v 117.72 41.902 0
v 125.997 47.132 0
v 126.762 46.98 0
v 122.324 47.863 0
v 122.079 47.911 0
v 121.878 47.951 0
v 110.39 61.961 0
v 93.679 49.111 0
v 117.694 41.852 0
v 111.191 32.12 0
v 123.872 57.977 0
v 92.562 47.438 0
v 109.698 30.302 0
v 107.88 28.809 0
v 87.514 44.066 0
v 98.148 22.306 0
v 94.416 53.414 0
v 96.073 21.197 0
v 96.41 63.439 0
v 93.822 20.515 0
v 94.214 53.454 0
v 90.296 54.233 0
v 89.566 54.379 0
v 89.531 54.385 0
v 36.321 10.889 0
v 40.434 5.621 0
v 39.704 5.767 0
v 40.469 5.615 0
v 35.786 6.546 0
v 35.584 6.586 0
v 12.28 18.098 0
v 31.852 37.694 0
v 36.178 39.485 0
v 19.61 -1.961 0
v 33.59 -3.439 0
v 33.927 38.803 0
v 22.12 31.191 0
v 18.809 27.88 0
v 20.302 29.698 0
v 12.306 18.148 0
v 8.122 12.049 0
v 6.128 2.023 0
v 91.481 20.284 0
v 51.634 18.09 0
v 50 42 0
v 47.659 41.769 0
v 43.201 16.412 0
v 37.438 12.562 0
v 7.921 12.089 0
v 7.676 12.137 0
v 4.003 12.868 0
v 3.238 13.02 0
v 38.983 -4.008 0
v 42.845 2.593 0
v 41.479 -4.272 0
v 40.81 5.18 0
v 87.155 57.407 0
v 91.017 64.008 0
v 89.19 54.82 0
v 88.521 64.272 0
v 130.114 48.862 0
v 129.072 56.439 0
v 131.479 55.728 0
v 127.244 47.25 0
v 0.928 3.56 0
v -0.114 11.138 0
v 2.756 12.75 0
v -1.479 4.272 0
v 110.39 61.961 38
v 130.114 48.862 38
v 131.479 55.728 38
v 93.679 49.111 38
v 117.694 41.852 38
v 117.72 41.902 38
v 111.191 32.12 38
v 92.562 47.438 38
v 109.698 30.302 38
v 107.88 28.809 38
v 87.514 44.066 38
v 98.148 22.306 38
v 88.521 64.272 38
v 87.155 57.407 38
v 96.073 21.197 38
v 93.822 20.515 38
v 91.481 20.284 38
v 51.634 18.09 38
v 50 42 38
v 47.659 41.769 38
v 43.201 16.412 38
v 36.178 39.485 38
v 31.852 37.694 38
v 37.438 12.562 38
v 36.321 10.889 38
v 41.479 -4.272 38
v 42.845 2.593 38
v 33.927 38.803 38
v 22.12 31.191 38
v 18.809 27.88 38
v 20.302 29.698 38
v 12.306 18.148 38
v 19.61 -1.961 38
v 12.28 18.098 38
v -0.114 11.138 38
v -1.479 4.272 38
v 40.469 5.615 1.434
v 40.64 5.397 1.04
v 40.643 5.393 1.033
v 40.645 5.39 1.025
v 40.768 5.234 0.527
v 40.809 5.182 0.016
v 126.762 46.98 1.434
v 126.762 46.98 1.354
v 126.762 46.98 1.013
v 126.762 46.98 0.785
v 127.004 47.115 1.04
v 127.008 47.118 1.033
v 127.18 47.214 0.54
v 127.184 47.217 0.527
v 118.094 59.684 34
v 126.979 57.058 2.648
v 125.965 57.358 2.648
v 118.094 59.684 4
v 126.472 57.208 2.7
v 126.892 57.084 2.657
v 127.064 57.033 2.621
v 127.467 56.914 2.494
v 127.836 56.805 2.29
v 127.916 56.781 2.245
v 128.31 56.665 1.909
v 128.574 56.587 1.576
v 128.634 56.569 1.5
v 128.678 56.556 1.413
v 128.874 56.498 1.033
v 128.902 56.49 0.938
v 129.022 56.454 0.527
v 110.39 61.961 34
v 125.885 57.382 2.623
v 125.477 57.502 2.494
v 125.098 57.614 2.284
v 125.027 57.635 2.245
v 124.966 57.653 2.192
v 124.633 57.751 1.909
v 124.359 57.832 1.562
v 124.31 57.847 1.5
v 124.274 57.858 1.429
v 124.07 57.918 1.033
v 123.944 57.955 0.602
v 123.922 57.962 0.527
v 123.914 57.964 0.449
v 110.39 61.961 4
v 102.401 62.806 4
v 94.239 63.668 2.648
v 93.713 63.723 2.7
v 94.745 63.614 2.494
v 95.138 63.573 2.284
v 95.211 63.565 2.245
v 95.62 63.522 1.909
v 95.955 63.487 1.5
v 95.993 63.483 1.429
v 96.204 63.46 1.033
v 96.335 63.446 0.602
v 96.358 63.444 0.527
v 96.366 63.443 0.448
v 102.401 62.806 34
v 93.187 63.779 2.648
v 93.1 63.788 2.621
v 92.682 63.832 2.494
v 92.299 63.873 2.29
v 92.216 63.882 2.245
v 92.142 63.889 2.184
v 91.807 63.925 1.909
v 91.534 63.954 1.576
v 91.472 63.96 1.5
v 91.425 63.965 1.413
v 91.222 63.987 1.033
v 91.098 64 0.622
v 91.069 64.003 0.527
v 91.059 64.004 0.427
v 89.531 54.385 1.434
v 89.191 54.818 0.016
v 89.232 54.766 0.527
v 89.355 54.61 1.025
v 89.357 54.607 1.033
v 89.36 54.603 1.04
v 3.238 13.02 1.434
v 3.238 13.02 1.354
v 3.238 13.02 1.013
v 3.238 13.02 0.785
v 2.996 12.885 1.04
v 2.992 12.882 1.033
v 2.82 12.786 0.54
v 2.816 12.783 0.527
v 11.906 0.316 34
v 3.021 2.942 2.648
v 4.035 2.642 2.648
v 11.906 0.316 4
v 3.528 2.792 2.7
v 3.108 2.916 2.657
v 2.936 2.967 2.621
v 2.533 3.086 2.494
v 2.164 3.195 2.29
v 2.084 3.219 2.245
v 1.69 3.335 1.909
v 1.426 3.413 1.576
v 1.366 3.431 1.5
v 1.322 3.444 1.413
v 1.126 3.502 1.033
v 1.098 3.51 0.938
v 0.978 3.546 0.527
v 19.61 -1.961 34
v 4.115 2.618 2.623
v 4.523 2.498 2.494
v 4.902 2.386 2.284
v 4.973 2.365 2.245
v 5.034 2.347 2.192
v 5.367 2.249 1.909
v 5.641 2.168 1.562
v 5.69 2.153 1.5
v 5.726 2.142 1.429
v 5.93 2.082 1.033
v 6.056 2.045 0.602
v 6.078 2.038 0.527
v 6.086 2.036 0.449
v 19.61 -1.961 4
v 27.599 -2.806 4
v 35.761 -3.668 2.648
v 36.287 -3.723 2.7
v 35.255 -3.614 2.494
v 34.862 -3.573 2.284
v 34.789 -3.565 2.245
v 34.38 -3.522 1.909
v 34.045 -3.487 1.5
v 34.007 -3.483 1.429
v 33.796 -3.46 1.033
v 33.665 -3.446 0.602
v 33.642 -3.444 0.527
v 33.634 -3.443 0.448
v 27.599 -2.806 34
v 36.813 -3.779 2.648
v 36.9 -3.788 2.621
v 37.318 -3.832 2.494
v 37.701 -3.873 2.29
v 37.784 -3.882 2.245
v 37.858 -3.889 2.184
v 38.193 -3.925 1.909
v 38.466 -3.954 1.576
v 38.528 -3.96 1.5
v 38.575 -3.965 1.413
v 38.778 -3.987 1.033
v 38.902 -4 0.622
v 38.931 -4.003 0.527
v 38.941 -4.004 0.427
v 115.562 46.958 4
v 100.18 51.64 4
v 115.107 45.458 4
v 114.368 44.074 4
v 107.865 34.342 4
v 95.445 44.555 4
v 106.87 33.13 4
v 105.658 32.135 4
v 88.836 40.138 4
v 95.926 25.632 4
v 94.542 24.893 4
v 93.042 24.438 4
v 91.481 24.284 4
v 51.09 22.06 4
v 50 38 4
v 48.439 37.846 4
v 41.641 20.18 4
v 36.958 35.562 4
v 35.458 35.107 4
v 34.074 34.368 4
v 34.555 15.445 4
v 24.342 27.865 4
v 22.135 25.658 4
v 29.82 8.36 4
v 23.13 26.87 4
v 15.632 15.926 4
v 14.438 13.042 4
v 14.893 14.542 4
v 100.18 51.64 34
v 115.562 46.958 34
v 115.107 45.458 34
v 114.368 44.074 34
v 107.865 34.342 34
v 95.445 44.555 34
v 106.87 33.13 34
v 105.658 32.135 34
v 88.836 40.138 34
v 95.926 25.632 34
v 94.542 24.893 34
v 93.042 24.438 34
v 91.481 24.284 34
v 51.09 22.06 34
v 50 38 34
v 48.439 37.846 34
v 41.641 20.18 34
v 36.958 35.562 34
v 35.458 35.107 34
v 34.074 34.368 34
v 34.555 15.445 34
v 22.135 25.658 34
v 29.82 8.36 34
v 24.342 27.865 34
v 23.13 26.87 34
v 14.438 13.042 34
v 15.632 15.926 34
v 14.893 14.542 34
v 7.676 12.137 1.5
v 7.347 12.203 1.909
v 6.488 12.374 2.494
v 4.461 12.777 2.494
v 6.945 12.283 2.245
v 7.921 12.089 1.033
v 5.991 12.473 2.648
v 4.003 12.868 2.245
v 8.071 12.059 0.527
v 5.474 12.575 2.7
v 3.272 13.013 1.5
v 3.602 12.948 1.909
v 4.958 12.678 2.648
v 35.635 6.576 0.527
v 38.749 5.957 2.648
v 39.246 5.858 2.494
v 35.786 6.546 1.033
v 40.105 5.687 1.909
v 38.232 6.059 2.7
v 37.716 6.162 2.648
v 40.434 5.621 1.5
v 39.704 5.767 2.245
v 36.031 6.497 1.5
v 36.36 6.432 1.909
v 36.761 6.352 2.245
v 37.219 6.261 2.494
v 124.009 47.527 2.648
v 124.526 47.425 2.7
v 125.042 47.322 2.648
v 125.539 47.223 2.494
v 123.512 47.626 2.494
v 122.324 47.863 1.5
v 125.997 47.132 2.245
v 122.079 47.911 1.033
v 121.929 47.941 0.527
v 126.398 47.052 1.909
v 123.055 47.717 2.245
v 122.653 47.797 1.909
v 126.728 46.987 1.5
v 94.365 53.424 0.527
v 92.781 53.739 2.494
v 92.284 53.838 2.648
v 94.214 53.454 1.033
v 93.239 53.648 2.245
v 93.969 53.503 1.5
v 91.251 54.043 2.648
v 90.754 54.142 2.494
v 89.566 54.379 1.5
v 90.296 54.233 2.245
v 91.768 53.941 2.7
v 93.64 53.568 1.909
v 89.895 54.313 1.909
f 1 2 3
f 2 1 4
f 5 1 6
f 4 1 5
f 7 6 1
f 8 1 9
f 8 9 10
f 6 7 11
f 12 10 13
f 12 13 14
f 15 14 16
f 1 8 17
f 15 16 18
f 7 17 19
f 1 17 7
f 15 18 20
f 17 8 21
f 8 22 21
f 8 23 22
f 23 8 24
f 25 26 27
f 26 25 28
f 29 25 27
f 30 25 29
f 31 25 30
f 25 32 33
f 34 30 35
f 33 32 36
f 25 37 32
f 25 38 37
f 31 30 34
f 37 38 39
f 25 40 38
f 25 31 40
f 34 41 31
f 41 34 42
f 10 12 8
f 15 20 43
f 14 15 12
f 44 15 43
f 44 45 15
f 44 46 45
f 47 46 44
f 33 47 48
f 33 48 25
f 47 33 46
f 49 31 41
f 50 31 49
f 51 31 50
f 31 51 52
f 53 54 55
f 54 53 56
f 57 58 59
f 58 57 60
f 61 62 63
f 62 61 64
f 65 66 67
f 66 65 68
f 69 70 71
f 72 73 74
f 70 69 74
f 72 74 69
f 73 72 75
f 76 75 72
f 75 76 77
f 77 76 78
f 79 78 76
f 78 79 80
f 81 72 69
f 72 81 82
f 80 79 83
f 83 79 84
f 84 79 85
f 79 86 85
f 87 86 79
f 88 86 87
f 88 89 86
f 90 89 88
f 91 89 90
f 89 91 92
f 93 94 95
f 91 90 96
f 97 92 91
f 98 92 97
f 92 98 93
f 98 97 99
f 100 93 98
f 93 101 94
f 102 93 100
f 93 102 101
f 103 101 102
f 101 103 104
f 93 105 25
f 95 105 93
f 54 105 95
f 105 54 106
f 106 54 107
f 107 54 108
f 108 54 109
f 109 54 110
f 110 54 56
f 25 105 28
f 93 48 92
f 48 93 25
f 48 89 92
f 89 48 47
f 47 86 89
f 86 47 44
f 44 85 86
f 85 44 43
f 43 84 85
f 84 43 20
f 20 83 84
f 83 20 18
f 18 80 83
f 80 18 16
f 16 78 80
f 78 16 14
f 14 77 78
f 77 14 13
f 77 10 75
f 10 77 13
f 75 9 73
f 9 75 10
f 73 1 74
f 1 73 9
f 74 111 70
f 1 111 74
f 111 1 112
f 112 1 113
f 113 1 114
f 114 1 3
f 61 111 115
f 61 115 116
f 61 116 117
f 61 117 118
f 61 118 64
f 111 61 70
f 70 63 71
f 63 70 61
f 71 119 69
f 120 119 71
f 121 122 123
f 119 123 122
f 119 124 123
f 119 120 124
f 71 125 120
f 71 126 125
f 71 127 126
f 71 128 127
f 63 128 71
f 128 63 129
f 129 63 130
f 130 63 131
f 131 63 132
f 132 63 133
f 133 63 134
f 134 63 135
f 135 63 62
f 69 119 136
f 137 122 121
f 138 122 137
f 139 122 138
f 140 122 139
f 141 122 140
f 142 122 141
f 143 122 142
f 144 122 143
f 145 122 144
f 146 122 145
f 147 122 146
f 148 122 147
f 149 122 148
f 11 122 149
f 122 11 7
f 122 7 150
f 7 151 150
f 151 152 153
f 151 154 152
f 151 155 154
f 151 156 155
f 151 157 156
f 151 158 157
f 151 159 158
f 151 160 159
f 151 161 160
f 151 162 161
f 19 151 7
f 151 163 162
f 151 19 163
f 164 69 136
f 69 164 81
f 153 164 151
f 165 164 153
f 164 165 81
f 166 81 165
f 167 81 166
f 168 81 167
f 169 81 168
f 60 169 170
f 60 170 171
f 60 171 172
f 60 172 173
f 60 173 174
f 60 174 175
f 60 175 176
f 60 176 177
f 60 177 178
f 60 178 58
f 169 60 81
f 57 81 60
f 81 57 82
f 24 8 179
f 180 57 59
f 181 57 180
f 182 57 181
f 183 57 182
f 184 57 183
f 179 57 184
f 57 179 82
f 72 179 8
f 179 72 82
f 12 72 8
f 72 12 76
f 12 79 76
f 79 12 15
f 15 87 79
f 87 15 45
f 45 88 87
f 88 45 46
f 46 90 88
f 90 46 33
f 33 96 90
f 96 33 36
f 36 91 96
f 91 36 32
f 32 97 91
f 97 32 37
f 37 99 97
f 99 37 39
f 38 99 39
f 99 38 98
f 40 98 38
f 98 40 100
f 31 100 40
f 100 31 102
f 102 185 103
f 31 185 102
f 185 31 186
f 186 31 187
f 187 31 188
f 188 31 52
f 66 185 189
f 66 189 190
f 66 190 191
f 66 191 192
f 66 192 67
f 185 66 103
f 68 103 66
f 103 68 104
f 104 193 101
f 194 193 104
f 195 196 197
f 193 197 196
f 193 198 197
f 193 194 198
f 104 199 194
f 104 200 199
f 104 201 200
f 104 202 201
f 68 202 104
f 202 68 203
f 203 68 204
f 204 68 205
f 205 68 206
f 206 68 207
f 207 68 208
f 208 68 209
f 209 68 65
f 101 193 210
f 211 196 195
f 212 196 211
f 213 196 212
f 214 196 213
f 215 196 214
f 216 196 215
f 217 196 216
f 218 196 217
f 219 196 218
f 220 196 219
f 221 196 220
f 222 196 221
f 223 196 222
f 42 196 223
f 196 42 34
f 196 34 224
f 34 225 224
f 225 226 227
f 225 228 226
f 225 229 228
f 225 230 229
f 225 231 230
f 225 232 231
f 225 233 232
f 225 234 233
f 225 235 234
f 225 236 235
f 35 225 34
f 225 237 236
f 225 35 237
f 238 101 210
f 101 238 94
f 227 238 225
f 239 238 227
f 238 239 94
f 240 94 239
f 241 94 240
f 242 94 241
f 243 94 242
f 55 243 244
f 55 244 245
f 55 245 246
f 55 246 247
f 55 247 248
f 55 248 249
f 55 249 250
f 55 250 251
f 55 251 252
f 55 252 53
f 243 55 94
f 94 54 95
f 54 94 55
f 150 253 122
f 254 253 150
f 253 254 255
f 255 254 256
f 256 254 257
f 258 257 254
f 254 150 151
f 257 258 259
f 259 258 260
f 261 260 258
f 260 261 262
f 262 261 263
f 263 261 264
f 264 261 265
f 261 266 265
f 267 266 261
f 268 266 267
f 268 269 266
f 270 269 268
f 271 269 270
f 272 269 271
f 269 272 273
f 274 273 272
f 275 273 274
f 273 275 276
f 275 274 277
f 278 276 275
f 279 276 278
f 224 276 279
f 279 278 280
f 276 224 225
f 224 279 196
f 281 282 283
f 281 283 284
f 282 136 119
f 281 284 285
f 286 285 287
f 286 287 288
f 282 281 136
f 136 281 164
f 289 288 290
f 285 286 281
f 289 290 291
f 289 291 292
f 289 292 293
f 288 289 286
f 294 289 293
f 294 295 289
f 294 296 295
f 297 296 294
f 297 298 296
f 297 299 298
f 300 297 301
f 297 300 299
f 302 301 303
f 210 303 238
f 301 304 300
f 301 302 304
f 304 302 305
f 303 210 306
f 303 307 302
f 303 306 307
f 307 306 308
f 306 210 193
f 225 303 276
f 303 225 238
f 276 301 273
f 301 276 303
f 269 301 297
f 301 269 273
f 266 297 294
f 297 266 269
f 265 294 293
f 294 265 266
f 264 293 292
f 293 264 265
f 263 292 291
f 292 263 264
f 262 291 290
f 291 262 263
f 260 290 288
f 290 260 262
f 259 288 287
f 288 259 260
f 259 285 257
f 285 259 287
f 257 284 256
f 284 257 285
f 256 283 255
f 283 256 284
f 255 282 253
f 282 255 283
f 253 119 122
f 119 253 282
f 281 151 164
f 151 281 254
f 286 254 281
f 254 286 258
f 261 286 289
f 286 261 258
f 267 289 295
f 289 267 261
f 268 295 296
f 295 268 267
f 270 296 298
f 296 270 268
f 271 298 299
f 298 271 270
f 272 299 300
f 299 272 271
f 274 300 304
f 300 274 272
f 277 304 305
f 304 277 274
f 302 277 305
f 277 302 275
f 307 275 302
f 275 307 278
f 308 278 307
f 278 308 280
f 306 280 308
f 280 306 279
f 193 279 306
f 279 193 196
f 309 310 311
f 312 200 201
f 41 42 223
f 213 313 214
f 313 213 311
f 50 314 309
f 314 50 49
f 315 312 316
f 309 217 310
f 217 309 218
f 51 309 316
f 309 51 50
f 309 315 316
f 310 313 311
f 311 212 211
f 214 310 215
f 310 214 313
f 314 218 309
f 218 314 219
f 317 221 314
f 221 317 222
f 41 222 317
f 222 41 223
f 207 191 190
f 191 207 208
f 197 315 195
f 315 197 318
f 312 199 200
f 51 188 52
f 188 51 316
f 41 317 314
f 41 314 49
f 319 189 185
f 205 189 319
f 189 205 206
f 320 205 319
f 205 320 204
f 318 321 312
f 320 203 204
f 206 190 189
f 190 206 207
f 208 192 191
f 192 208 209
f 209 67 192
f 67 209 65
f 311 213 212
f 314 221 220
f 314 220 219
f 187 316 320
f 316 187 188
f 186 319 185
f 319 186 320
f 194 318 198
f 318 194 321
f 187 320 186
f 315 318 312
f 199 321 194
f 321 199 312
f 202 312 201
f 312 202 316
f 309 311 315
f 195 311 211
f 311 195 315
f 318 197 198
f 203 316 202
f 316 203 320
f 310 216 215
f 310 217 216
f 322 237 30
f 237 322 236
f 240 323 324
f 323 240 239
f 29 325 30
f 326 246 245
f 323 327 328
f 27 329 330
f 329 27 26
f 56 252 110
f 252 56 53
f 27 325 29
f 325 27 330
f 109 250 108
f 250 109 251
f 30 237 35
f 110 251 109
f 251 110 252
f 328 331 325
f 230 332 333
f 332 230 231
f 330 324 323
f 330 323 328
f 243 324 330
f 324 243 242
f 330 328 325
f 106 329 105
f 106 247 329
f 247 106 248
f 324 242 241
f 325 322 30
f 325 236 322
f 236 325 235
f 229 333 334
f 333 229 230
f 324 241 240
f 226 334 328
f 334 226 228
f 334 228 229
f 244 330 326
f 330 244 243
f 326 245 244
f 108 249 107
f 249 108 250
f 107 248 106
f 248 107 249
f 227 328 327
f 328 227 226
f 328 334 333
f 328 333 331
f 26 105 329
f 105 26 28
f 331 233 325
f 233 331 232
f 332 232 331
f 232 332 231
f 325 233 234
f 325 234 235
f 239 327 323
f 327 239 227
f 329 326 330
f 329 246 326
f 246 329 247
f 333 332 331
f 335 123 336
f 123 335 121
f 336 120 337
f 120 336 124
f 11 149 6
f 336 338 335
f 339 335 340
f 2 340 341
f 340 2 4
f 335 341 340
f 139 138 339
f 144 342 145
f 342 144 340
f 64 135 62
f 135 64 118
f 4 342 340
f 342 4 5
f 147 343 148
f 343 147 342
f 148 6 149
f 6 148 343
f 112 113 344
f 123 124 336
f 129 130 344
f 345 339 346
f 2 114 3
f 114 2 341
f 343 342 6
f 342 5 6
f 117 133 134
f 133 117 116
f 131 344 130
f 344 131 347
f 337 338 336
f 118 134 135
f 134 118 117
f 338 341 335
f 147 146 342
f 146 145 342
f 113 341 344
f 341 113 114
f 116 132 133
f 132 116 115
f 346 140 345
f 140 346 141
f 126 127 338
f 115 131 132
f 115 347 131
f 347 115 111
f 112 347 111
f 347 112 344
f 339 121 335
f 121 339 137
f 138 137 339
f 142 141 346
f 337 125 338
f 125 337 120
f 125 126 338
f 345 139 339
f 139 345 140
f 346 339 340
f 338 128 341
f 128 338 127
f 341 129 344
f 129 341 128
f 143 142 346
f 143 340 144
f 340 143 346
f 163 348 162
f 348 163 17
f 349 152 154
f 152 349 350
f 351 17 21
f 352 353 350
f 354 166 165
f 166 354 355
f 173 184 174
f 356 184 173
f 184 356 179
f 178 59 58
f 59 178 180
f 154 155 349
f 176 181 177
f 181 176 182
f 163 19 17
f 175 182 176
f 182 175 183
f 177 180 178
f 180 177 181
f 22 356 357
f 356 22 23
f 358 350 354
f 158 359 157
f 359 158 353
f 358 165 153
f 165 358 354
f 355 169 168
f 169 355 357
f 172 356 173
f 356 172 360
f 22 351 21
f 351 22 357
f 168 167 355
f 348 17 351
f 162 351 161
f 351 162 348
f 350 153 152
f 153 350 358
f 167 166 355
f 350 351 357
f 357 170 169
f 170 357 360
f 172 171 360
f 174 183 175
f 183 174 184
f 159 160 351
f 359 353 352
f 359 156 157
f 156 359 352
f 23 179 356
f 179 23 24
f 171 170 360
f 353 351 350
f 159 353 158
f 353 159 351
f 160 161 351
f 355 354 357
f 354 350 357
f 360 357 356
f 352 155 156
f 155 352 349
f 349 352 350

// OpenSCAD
$fn = 32;

// ----------------------------------------------------------------------
// Air duct: 24 mm duct, 4 mm wall, 38 mm across
// ----------------------------------------------------------------------

// --- parameters (mm) ---
duct_r = 12;              // duct core radius
duct_d = 24;              // duct core diameter
wall = 4;                 // duct wall thickness
height = 38;              // duct width (extrusion height)
port_r = 21.9;            // port flange half width
port_d = 43.8;            // port flange width
port_t = 7;               // port flange thickness
bolt_d = 5.4;             // port bolt holes
bolt_offset = 16.7;       // bolt hole offset from the port axis

difference() {
  /* outer hull chain: tube with a flat flange plate at every port */
  linear_extrude(height = 38) {
    hull() {
      polygon([[41.479, -4.272], [-1.479, 4.272], [-0.114, 11.138], [42.845, 2.593]]);
      translate([21.951, 9.808]) circle(r = 12);
    }
    hull() {
      translate([21.951, 9.808]) circle(r = 12);
      translate([22.284, 11.481]) circle(r = 12);
    }
    hull() {
      translate([22.284, 11.481]) circle(r = 12);
      translate([28.787, 21.213]) circle(r = 12);
    }
    hull() {
      translate([28.787, 21.213]) circle(r = 12);
      translate([38.519, 27.716]) circle(r = 12);
    }
    hull() {
      translate([38.519, 27.716]) circle(r = 12);
      translate([50, 30]) circle(r = 12);
    }
    hull() {
      translate([50, 30]) circle(r = 12);
      translate([91.481, 32.284]) circle(r = 12);
    }
    hull() {
      translate([91.481, 32.284]) circle(r = 12);
      translate([101.213, 38.787]) circle(r = 12);
    }
    hull() {
      translate([101.213, 38.787]) circle(r = 12);
      translate([107.716, 48.519]) circle(r = 12);
    }
    hull() {
      translate([107.716, 48.519]) circle(r = 12);
      translate([108.049, 50.192]) circle(r = 12);
    }
    hull() {
      translate([108.049, 50.192]) circle(r = 12);
      polygon([[88.521, 64.272], [131.479, 55.728], [130.114, 48.862], [87.155, 57.407]]);
    }
  }
  /* air passage: the same chain inset by the wall, 5 mm proud of the ports */
  translate([0, 0, 4]) linear_extrude(height = 30) {
    hull() {
      translate([19.025, -4.904]) circle(r = 8);
      translate([22.284, 11.481]) circle(r = 8);
    }
    hull() {
      translate([22.284, 11.481]) circle(r = 8);
      translate([28.787, 21.213]) circle(r = 8);
    }
    hull() {
      translate([28.787, 21.213]) circle(r = 8);
      translate([38.519, 27.716]) circle(r = 8);
    }
    hull() {
      translate([38.519, 27.716]) circle(r = 8);
      translate([50, 30]) circle(r = 8);
    }
    hull() {
      translate([50, 30]) circle(r = 8);
      translate([91.481, 32.284]) circle(r = 8);
    }
    hull() {
      translate([91.481, 32.284]) circle(r = 8);
      translate([101.213, 38.787]) circle(r = 8);
    }
    hull() {
      translate([101.213, 38.787]) circle(r = 8);
      translate([107.716, 48.519]) circle(r = 8);
    }
    hull() {
      translate([107.716, 48.519]) circle(r = 8);
      translate([110.975, 64.904]) circle(r = 8);
    }
  }
  translate([20, 0]) rotate([0, 0, -11.25]) translate([-16.7, -2.5]) rotate([-90, 0, 0]) cylinder(h = 12, d = 5.4);
  translate([20, 0]) rotate([0, 0, -11.25]) translate([16.7, -2.5]) rotate([-90, 0, 0]) cylinder(h = 12, d = 5.4);
  translate([110, 60]) rotate([0, 0, 168.75]) translate([-16.7, -2.5]) rotate([-90, 0, 0]) cylinder(h = 12, d = 5.4);
  translate([110, 60]) rotate([0, 0, 168.75]) translate([16.7, -2.5]) rotate([-90, 0, 0]) cylinder(h = 12, d = 5.4);
}
